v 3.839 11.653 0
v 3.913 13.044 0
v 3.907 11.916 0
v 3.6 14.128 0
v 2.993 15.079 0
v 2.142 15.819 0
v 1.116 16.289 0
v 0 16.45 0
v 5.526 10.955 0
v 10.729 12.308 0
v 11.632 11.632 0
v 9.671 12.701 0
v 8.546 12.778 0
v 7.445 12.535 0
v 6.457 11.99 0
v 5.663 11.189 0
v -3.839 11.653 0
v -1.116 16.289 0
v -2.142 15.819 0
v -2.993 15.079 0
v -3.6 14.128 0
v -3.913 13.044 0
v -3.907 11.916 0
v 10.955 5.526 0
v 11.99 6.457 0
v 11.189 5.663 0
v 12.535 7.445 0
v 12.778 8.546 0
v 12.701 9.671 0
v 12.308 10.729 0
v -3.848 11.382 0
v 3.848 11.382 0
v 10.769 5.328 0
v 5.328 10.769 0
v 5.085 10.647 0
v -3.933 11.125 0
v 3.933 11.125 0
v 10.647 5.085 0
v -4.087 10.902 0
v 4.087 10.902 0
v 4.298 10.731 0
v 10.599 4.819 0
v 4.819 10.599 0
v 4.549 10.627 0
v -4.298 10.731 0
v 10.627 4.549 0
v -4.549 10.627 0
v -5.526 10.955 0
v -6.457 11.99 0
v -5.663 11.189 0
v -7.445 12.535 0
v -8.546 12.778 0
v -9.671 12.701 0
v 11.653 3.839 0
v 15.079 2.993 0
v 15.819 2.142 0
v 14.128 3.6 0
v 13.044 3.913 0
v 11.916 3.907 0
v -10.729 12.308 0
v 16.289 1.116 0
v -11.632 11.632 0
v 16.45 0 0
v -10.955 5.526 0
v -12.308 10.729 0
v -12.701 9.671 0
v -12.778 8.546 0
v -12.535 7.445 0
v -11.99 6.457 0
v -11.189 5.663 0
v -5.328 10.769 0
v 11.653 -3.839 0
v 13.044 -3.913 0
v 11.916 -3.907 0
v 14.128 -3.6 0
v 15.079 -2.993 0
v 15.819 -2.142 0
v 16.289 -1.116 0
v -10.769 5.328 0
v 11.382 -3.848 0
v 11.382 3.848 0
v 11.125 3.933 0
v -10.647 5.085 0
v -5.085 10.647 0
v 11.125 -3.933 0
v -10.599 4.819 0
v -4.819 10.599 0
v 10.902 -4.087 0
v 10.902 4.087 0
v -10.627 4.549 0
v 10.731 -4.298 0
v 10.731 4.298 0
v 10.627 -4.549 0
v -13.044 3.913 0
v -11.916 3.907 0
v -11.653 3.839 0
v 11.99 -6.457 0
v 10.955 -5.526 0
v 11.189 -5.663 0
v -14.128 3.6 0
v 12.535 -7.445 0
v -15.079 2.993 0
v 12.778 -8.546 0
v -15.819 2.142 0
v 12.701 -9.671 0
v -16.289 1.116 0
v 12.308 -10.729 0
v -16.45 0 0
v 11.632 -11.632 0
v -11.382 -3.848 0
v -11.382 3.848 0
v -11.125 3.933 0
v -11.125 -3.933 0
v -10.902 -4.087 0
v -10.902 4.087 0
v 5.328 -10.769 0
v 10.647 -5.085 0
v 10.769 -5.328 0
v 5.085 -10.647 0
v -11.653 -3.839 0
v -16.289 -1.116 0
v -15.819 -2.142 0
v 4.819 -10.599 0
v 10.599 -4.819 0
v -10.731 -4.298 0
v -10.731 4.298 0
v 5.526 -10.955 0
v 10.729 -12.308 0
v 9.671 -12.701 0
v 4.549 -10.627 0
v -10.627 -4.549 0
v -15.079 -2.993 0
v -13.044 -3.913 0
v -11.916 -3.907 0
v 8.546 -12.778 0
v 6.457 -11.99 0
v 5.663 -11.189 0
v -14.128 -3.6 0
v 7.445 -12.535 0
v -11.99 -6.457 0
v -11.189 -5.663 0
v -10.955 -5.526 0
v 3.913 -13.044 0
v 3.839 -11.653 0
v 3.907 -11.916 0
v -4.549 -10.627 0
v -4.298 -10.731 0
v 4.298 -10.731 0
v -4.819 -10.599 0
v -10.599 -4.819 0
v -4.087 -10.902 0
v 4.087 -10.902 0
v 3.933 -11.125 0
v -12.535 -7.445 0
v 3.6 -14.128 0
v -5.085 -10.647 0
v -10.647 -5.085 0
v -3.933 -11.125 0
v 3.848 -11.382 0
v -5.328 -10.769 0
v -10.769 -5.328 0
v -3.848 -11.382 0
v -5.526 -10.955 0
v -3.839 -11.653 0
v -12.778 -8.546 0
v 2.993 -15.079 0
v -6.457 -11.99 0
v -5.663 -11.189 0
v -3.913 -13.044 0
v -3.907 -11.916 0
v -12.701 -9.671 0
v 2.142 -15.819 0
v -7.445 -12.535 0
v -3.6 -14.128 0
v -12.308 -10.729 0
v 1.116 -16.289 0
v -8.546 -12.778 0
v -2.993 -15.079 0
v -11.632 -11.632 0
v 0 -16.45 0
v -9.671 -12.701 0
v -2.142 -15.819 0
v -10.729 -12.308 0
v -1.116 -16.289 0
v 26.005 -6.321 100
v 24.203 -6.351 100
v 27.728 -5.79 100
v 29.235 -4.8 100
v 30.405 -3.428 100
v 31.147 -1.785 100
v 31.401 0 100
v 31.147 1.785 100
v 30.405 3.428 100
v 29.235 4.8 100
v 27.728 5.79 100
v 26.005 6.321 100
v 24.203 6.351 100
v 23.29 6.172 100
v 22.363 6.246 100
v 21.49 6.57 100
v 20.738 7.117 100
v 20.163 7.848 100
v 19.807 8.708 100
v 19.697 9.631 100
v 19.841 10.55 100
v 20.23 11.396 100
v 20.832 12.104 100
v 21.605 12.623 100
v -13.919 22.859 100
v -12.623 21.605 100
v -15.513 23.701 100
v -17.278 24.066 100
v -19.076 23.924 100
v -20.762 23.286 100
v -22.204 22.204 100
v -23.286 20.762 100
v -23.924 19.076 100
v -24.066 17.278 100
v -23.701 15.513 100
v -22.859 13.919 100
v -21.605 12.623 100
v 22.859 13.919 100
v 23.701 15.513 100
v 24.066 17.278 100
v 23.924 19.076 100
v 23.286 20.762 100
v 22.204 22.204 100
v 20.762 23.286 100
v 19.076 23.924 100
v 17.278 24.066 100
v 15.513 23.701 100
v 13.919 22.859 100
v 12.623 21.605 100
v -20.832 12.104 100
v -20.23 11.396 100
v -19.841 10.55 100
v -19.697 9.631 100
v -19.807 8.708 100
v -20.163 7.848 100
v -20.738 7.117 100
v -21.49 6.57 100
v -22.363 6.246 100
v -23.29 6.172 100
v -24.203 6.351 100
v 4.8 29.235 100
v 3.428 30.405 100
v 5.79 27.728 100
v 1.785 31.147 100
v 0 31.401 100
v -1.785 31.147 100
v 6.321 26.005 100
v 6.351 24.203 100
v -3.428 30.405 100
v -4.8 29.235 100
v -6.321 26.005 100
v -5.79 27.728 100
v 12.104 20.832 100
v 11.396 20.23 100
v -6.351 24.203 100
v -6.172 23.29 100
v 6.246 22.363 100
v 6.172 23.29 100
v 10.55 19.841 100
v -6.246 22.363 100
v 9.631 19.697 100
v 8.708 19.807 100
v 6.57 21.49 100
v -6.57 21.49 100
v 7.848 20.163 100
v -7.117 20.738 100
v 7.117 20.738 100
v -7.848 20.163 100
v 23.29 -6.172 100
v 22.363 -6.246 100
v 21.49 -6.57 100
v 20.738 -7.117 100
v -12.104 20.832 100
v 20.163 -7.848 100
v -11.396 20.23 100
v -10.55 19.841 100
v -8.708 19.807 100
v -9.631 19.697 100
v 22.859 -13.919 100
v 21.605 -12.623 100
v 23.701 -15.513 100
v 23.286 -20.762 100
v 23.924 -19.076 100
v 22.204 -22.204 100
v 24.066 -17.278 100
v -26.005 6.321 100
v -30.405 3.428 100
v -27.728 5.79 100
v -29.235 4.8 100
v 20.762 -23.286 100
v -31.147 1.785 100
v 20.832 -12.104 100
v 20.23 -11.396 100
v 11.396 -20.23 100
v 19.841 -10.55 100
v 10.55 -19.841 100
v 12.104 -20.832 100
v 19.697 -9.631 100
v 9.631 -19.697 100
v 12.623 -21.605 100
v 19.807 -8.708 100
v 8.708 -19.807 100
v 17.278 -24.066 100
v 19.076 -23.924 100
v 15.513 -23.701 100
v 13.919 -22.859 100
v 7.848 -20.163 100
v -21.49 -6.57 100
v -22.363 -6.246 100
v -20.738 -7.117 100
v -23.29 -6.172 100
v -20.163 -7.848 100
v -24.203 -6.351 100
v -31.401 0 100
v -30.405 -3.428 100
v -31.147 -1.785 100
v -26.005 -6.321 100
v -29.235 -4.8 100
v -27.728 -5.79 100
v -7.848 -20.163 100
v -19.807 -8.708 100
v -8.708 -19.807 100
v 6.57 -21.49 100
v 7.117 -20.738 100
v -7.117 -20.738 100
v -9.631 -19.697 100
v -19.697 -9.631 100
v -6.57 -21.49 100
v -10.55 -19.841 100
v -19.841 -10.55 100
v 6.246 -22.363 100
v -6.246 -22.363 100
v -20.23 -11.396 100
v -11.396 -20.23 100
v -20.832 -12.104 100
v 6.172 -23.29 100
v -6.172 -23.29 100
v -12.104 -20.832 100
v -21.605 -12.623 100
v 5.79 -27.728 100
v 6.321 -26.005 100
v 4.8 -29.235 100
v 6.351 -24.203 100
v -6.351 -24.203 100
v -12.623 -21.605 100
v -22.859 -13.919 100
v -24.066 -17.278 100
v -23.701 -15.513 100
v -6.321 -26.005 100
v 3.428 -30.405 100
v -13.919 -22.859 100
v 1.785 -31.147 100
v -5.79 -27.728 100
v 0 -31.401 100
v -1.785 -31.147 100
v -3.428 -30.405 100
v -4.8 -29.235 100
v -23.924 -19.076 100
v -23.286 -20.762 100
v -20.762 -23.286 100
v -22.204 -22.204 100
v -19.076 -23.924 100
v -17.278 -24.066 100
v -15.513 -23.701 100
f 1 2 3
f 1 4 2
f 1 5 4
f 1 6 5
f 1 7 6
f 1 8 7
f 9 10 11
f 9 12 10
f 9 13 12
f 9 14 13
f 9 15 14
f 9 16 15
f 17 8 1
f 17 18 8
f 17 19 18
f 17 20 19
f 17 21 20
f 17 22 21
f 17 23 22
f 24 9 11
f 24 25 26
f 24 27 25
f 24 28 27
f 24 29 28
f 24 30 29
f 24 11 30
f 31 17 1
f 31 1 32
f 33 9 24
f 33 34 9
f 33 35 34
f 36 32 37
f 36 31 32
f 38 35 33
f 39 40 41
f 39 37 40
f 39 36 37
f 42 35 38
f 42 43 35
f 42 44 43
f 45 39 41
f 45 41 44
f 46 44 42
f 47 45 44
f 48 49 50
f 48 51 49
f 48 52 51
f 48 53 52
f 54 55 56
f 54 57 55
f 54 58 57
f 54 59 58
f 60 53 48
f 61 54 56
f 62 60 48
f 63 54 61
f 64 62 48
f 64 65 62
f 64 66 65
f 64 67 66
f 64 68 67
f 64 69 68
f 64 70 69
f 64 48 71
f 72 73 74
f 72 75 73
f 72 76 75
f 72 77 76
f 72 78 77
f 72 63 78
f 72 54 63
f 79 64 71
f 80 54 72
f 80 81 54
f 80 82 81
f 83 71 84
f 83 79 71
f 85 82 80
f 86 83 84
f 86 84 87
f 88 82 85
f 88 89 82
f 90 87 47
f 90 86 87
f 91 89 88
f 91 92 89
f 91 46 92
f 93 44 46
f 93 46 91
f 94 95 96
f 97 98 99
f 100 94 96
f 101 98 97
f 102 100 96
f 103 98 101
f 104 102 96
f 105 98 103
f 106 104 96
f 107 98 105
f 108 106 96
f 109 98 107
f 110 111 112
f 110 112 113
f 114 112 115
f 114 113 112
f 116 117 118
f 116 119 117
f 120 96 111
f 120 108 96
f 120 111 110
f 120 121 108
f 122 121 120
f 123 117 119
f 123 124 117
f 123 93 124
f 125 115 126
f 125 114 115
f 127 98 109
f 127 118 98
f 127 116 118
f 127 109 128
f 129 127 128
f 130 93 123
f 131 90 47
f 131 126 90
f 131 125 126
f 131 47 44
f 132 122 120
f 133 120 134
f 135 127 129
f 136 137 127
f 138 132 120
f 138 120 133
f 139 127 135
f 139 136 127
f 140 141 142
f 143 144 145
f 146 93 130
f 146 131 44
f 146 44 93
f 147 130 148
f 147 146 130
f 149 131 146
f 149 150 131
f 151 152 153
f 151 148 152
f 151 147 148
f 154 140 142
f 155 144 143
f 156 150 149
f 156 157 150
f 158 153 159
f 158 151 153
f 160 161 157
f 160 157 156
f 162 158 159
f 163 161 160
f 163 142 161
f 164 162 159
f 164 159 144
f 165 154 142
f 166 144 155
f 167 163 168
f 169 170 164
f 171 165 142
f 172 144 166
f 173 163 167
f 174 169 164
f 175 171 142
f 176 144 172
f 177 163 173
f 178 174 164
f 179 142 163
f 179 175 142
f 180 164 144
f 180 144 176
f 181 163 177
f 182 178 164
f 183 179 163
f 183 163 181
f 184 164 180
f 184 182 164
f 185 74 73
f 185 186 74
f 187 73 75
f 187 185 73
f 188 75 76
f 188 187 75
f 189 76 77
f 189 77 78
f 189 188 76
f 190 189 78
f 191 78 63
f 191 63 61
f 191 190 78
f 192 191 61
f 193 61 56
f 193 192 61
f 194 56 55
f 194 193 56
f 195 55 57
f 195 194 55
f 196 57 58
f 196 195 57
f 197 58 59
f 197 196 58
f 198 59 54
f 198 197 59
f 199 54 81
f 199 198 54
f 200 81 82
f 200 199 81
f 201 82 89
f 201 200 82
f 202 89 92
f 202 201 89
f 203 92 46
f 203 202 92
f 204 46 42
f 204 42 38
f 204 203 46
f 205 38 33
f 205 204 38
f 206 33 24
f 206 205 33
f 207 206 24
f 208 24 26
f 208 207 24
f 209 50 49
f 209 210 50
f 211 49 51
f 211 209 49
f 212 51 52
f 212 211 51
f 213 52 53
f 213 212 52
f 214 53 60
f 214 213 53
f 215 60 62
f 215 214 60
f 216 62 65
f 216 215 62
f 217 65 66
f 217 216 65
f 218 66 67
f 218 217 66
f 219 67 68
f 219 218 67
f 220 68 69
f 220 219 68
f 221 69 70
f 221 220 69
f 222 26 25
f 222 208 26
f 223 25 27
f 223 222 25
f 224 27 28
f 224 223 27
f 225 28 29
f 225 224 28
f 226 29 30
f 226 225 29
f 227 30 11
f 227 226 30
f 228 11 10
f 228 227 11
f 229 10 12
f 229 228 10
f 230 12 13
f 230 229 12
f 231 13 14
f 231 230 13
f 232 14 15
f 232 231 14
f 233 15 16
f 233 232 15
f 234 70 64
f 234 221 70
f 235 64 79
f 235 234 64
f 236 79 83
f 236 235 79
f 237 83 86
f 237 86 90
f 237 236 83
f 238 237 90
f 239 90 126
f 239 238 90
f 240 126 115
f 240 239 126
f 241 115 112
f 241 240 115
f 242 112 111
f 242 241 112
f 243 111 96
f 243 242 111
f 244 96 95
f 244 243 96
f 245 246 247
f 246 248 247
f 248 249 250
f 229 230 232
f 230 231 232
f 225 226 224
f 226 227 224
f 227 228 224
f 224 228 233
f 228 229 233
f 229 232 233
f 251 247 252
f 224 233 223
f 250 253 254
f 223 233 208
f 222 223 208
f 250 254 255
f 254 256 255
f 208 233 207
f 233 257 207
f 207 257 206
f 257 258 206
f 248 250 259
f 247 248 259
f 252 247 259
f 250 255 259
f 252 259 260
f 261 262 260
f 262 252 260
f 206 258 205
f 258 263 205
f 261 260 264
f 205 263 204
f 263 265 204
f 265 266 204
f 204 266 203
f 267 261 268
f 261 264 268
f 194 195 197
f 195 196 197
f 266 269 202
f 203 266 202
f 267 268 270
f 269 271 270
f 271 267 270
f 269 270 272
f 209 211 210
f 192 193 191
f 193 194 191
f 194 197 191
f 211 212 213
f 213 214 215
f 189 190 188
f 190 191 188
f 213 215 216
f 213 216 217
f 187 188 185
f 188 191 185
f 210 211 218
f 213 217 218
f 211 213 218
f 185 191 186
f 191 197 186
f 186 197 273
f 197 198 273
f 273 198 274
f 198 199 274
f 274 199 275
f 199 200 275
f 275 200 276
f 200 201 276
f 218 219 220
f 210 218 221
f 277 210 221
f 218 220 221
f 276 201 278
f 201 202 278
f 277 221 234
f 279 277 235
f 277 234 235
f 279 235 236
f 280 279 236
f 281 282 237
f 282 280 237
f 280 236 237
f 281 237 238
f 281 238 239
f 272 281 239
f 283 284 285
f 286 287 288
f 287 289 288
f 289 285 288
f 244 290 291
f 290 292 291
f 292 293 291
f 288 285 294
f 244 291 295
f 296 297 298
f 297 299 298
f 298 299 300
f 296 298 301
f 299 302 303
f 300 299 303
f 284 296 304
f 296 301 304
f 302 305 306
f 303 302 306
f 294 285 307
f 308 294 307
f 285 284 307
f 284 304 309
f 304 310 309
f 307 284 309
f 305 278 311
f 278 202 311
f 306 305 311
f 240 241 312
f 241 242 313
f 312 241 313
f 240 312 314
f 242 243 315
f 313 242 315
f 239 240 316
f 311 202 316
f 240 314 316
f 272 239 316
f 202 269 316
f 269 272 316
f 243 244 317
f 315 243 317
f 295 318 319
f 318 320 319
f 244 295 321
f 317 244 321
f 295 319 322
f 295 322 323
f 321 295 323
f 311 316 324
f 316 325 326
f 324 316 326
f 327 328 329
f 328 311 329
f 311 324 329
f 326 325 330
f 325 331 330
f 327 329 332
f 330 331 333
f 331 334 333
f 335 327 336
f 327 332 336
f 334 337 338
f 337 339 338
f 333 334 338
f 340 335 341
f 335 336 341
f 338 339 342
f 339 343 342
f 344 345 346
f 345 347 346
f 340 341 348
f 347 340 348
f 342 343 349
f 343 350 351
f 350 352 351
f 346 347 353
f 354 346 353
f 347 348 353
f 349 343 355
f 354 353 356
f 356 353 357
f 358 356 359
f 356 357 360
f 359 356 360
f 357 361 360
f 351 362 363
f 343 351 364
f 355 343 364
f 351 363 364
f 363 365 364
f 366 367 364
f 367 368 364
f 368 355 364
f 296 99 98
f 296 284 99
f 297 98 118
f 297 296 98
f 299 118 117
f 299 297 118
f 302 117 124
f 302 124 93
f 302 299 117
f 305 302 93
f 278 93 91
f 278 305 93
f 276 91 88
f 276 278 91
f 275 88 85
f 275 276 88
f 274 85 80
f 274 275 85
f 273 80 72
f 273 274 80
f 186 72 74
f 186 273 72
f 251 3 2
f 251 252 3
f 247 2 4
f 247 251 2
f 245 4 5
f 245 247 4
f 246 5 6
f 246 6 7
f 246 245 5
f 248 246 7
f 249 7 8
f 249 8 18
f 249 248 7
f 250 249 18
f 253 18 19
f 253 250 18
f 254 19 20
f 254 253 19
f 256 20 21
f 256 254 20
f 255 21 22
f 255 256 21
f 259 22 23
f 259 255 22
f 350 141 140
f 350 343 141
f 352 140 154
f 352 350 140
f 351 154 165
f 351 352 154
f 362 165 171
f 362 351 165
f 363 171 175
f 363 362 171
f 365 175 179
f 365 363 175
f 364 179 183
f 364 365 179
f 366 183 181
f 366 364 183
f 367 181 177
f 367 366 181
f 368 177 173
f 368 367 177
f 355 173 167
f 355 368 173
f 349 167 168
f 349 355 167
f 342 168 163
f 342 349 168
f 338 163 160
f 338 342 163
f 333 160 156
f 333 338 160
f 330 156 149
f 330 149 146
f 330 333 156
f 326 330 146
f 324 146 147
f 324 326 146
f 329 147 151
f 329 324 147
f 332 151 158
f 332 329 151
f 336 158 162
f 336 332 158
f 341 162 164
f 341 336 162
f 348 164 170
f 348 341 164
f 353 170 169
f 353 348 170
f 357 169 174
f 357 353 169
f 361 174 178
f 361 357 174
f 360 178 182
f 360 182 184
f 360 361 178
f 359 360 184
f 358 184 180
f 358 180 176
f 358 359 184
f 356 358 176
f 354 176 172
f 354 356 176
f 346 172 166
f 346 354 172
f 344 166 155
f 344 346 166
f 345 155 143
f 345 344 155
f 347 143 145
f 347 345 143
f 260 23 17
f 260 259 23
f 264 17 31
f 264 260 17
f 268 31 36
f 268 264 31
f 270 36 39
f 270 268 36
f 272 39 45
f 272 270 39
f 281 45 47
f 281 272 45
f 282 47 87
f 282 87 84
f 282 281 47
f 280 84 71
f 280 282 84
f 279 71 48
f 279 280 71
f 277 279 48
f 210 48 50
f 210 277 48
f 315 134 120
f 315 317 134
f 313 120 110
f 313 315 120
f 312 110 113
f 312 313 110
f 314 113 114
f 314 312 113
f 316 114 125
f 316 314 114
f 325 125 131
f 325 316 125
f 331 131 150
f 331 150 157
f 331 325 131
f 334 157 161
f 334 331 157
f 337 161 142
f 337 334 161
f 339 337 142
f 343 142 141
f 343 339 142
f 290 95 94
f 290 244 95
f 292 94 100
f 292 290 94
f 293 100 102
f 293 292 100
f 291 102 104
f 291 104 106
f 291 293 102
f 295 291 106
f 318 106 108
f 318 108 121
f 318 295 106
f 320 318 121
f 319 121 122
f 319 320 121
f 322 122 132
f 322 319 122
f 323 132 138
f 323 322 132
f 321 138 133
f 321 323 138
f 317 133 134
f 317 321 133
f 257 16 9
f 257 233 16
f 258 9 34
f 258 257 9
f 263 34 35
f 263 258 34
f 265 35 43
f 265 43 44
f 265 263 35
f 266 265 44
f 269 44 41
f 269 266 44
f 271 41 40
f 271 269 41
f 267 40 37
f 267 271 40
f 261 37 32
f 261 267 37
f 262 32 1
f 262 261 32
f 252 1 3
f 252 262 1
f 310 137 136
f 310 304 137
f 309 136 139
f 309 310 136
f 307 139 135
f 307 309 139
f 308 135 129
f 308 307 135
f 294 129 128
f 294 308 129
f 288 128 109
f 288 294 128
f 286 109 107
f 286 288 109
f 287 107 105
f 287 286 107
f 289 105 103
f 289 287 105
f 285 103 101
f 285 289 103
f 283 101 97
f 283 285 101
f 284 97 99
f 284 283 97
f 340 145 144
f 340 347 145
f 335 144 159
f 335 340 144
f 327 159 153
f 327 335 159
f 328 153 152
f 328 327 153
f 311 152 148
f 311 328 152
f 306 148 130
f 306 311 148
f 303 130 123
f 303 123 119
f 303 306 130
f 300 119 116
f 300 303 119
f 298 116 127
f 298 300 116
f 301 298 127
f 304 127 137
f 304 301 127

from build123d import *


with BuildPart() as f3:
    # F0 (on Top) → F3 section 0
    with BuildSketch(Plane.XY):
        with BuildLine():
            ThreePointArc((11.91593, 3.907013), (10.670413, 4.41983), (11.18851, 5.66316))
            ThreePointArc((11.18851, 5.66316), (11.63221, 11.63221), (5.66316, 11.18851))
            ThreePointArc((5.66316, 11.18851), (4.41983, 10.670413), (3.907013, 11.91593))
            ThreePointArc((3.907013, 11.91593), (0, 16.450429), (-3.907013, 11.91593))
            ThreePointArc((-3.907013, 11.91593), (-4.41983, 10.670413), (-5.66316, 11.18851))
            ThreePointArc((-5.66316, 11.18851), (-11.63221, 11.63221), (-11.18851, 5.66316))
            ThreePointArc((-11.18851, 5.66316), (-10.670413, 4.41983), (-11.91593, 3.907013))
            ThreePointArc((-11.91593, 3.907013), (-16.450429, 0), (-11.91593, -3.907013))
            ThreePointArc((-11.91593, -3.907013), (-10.670413, -4.41983), (-11.18851, -5.66316))
            ThreePointArc((-11.18851, -5.66316), (-11.63221, -11.63221), (-5.66316, -11.18851))
            ThreePointArc((-5.66316, -11.18851), (-4.41983, -10.670413), (-3.907013, -11.91593))
            ThreePointArc((-3.907013, -11.91593), (0, -16.450429), (3.907013, -11.91593))
            ThreePointArc((3.907013, -11.91593), (4.41983, -10.670413), (5.66316, -11.18851))
            ThreePointArc((5.66316, -11.18851), (11.63221, -11.63221), (11.18851, -5.66316))
            ThreePointArc((11.18851, -5.66316), (10.670413, -4.41983), (11.91593, -3.907013))
            ThreePointArc((11.91593, -3.907013), (16.450429, 0), (11.91593, 3.907013))
        make_face()
    # F2 (on offset) → F3 section 1
    with BuildSketch(Plane.XY.offset(100)):
        with BuildLine():
            ThreePointArc((24.202745, 6.351012), (19.955006, 8.265634), (21.604769, 12.623082))
            ThreePointArc((21.604769, 12.623082), (22.203759, 22.203759), (12.623082, 21.604769))
            ThreePointArc((12.623082, 21.604769), (8.265634, 19.955006), (6.351012, 24.202745))
            ThreePointArc((6.351012, 24.202745), (0, 31.400857), (-6.351012, 24.202745))
            ThreePointArc((-6.351012, 24.202745), (-8.265634, 19.955006), (-12.623082, 21.604769))
            ThreePointArc((-12.623082, 21.604769), (-22.203759, 22.203759), (-21.604769, 12.623082))
            ThreePointArc((-21.604769, 12.623082), (-19.955006, 8.265634), (-24.202745, 6.351012))
            ThreePointArc((-24.202745, 6.351012), (-31.400857, 0), (-24.202745, -6.351012))
            ThreePointArc((-24.202745, -6.351012), (-19.955006, -8.265634), (-21.604769, -12.623082))
            ThreePointArc((-21.604769, -12.623082), (-22.203759, -22.203759), (-12.623082, -21.604769))
            ThreePointArc((-12.623082, -21.604769), (-8.265634, -19.955006), (-6.351012, -24.202745))
            ThreePointArc((-6.351012, -24.202745), (0, -31.400857), (6.351012, -24.202745))
            ThreePointArc((6.351012, -24.202745), (8.265634, -19.955006), (12.623082, -21.604769))
            ThreePointArc((12.623082, -21.604769), (22.203759, -22.203759), (21.604769, -12.623082))
            ThreePointArc((21.604769, -12.623082), (19.955006, -8.265634), (24.202745, -6.351012))
            ThreePointArc((24.202745, -6.351012), (31.400857, 0), (24.202745, 6.351012))
        make_face()
    loft()


solid = f3.part
